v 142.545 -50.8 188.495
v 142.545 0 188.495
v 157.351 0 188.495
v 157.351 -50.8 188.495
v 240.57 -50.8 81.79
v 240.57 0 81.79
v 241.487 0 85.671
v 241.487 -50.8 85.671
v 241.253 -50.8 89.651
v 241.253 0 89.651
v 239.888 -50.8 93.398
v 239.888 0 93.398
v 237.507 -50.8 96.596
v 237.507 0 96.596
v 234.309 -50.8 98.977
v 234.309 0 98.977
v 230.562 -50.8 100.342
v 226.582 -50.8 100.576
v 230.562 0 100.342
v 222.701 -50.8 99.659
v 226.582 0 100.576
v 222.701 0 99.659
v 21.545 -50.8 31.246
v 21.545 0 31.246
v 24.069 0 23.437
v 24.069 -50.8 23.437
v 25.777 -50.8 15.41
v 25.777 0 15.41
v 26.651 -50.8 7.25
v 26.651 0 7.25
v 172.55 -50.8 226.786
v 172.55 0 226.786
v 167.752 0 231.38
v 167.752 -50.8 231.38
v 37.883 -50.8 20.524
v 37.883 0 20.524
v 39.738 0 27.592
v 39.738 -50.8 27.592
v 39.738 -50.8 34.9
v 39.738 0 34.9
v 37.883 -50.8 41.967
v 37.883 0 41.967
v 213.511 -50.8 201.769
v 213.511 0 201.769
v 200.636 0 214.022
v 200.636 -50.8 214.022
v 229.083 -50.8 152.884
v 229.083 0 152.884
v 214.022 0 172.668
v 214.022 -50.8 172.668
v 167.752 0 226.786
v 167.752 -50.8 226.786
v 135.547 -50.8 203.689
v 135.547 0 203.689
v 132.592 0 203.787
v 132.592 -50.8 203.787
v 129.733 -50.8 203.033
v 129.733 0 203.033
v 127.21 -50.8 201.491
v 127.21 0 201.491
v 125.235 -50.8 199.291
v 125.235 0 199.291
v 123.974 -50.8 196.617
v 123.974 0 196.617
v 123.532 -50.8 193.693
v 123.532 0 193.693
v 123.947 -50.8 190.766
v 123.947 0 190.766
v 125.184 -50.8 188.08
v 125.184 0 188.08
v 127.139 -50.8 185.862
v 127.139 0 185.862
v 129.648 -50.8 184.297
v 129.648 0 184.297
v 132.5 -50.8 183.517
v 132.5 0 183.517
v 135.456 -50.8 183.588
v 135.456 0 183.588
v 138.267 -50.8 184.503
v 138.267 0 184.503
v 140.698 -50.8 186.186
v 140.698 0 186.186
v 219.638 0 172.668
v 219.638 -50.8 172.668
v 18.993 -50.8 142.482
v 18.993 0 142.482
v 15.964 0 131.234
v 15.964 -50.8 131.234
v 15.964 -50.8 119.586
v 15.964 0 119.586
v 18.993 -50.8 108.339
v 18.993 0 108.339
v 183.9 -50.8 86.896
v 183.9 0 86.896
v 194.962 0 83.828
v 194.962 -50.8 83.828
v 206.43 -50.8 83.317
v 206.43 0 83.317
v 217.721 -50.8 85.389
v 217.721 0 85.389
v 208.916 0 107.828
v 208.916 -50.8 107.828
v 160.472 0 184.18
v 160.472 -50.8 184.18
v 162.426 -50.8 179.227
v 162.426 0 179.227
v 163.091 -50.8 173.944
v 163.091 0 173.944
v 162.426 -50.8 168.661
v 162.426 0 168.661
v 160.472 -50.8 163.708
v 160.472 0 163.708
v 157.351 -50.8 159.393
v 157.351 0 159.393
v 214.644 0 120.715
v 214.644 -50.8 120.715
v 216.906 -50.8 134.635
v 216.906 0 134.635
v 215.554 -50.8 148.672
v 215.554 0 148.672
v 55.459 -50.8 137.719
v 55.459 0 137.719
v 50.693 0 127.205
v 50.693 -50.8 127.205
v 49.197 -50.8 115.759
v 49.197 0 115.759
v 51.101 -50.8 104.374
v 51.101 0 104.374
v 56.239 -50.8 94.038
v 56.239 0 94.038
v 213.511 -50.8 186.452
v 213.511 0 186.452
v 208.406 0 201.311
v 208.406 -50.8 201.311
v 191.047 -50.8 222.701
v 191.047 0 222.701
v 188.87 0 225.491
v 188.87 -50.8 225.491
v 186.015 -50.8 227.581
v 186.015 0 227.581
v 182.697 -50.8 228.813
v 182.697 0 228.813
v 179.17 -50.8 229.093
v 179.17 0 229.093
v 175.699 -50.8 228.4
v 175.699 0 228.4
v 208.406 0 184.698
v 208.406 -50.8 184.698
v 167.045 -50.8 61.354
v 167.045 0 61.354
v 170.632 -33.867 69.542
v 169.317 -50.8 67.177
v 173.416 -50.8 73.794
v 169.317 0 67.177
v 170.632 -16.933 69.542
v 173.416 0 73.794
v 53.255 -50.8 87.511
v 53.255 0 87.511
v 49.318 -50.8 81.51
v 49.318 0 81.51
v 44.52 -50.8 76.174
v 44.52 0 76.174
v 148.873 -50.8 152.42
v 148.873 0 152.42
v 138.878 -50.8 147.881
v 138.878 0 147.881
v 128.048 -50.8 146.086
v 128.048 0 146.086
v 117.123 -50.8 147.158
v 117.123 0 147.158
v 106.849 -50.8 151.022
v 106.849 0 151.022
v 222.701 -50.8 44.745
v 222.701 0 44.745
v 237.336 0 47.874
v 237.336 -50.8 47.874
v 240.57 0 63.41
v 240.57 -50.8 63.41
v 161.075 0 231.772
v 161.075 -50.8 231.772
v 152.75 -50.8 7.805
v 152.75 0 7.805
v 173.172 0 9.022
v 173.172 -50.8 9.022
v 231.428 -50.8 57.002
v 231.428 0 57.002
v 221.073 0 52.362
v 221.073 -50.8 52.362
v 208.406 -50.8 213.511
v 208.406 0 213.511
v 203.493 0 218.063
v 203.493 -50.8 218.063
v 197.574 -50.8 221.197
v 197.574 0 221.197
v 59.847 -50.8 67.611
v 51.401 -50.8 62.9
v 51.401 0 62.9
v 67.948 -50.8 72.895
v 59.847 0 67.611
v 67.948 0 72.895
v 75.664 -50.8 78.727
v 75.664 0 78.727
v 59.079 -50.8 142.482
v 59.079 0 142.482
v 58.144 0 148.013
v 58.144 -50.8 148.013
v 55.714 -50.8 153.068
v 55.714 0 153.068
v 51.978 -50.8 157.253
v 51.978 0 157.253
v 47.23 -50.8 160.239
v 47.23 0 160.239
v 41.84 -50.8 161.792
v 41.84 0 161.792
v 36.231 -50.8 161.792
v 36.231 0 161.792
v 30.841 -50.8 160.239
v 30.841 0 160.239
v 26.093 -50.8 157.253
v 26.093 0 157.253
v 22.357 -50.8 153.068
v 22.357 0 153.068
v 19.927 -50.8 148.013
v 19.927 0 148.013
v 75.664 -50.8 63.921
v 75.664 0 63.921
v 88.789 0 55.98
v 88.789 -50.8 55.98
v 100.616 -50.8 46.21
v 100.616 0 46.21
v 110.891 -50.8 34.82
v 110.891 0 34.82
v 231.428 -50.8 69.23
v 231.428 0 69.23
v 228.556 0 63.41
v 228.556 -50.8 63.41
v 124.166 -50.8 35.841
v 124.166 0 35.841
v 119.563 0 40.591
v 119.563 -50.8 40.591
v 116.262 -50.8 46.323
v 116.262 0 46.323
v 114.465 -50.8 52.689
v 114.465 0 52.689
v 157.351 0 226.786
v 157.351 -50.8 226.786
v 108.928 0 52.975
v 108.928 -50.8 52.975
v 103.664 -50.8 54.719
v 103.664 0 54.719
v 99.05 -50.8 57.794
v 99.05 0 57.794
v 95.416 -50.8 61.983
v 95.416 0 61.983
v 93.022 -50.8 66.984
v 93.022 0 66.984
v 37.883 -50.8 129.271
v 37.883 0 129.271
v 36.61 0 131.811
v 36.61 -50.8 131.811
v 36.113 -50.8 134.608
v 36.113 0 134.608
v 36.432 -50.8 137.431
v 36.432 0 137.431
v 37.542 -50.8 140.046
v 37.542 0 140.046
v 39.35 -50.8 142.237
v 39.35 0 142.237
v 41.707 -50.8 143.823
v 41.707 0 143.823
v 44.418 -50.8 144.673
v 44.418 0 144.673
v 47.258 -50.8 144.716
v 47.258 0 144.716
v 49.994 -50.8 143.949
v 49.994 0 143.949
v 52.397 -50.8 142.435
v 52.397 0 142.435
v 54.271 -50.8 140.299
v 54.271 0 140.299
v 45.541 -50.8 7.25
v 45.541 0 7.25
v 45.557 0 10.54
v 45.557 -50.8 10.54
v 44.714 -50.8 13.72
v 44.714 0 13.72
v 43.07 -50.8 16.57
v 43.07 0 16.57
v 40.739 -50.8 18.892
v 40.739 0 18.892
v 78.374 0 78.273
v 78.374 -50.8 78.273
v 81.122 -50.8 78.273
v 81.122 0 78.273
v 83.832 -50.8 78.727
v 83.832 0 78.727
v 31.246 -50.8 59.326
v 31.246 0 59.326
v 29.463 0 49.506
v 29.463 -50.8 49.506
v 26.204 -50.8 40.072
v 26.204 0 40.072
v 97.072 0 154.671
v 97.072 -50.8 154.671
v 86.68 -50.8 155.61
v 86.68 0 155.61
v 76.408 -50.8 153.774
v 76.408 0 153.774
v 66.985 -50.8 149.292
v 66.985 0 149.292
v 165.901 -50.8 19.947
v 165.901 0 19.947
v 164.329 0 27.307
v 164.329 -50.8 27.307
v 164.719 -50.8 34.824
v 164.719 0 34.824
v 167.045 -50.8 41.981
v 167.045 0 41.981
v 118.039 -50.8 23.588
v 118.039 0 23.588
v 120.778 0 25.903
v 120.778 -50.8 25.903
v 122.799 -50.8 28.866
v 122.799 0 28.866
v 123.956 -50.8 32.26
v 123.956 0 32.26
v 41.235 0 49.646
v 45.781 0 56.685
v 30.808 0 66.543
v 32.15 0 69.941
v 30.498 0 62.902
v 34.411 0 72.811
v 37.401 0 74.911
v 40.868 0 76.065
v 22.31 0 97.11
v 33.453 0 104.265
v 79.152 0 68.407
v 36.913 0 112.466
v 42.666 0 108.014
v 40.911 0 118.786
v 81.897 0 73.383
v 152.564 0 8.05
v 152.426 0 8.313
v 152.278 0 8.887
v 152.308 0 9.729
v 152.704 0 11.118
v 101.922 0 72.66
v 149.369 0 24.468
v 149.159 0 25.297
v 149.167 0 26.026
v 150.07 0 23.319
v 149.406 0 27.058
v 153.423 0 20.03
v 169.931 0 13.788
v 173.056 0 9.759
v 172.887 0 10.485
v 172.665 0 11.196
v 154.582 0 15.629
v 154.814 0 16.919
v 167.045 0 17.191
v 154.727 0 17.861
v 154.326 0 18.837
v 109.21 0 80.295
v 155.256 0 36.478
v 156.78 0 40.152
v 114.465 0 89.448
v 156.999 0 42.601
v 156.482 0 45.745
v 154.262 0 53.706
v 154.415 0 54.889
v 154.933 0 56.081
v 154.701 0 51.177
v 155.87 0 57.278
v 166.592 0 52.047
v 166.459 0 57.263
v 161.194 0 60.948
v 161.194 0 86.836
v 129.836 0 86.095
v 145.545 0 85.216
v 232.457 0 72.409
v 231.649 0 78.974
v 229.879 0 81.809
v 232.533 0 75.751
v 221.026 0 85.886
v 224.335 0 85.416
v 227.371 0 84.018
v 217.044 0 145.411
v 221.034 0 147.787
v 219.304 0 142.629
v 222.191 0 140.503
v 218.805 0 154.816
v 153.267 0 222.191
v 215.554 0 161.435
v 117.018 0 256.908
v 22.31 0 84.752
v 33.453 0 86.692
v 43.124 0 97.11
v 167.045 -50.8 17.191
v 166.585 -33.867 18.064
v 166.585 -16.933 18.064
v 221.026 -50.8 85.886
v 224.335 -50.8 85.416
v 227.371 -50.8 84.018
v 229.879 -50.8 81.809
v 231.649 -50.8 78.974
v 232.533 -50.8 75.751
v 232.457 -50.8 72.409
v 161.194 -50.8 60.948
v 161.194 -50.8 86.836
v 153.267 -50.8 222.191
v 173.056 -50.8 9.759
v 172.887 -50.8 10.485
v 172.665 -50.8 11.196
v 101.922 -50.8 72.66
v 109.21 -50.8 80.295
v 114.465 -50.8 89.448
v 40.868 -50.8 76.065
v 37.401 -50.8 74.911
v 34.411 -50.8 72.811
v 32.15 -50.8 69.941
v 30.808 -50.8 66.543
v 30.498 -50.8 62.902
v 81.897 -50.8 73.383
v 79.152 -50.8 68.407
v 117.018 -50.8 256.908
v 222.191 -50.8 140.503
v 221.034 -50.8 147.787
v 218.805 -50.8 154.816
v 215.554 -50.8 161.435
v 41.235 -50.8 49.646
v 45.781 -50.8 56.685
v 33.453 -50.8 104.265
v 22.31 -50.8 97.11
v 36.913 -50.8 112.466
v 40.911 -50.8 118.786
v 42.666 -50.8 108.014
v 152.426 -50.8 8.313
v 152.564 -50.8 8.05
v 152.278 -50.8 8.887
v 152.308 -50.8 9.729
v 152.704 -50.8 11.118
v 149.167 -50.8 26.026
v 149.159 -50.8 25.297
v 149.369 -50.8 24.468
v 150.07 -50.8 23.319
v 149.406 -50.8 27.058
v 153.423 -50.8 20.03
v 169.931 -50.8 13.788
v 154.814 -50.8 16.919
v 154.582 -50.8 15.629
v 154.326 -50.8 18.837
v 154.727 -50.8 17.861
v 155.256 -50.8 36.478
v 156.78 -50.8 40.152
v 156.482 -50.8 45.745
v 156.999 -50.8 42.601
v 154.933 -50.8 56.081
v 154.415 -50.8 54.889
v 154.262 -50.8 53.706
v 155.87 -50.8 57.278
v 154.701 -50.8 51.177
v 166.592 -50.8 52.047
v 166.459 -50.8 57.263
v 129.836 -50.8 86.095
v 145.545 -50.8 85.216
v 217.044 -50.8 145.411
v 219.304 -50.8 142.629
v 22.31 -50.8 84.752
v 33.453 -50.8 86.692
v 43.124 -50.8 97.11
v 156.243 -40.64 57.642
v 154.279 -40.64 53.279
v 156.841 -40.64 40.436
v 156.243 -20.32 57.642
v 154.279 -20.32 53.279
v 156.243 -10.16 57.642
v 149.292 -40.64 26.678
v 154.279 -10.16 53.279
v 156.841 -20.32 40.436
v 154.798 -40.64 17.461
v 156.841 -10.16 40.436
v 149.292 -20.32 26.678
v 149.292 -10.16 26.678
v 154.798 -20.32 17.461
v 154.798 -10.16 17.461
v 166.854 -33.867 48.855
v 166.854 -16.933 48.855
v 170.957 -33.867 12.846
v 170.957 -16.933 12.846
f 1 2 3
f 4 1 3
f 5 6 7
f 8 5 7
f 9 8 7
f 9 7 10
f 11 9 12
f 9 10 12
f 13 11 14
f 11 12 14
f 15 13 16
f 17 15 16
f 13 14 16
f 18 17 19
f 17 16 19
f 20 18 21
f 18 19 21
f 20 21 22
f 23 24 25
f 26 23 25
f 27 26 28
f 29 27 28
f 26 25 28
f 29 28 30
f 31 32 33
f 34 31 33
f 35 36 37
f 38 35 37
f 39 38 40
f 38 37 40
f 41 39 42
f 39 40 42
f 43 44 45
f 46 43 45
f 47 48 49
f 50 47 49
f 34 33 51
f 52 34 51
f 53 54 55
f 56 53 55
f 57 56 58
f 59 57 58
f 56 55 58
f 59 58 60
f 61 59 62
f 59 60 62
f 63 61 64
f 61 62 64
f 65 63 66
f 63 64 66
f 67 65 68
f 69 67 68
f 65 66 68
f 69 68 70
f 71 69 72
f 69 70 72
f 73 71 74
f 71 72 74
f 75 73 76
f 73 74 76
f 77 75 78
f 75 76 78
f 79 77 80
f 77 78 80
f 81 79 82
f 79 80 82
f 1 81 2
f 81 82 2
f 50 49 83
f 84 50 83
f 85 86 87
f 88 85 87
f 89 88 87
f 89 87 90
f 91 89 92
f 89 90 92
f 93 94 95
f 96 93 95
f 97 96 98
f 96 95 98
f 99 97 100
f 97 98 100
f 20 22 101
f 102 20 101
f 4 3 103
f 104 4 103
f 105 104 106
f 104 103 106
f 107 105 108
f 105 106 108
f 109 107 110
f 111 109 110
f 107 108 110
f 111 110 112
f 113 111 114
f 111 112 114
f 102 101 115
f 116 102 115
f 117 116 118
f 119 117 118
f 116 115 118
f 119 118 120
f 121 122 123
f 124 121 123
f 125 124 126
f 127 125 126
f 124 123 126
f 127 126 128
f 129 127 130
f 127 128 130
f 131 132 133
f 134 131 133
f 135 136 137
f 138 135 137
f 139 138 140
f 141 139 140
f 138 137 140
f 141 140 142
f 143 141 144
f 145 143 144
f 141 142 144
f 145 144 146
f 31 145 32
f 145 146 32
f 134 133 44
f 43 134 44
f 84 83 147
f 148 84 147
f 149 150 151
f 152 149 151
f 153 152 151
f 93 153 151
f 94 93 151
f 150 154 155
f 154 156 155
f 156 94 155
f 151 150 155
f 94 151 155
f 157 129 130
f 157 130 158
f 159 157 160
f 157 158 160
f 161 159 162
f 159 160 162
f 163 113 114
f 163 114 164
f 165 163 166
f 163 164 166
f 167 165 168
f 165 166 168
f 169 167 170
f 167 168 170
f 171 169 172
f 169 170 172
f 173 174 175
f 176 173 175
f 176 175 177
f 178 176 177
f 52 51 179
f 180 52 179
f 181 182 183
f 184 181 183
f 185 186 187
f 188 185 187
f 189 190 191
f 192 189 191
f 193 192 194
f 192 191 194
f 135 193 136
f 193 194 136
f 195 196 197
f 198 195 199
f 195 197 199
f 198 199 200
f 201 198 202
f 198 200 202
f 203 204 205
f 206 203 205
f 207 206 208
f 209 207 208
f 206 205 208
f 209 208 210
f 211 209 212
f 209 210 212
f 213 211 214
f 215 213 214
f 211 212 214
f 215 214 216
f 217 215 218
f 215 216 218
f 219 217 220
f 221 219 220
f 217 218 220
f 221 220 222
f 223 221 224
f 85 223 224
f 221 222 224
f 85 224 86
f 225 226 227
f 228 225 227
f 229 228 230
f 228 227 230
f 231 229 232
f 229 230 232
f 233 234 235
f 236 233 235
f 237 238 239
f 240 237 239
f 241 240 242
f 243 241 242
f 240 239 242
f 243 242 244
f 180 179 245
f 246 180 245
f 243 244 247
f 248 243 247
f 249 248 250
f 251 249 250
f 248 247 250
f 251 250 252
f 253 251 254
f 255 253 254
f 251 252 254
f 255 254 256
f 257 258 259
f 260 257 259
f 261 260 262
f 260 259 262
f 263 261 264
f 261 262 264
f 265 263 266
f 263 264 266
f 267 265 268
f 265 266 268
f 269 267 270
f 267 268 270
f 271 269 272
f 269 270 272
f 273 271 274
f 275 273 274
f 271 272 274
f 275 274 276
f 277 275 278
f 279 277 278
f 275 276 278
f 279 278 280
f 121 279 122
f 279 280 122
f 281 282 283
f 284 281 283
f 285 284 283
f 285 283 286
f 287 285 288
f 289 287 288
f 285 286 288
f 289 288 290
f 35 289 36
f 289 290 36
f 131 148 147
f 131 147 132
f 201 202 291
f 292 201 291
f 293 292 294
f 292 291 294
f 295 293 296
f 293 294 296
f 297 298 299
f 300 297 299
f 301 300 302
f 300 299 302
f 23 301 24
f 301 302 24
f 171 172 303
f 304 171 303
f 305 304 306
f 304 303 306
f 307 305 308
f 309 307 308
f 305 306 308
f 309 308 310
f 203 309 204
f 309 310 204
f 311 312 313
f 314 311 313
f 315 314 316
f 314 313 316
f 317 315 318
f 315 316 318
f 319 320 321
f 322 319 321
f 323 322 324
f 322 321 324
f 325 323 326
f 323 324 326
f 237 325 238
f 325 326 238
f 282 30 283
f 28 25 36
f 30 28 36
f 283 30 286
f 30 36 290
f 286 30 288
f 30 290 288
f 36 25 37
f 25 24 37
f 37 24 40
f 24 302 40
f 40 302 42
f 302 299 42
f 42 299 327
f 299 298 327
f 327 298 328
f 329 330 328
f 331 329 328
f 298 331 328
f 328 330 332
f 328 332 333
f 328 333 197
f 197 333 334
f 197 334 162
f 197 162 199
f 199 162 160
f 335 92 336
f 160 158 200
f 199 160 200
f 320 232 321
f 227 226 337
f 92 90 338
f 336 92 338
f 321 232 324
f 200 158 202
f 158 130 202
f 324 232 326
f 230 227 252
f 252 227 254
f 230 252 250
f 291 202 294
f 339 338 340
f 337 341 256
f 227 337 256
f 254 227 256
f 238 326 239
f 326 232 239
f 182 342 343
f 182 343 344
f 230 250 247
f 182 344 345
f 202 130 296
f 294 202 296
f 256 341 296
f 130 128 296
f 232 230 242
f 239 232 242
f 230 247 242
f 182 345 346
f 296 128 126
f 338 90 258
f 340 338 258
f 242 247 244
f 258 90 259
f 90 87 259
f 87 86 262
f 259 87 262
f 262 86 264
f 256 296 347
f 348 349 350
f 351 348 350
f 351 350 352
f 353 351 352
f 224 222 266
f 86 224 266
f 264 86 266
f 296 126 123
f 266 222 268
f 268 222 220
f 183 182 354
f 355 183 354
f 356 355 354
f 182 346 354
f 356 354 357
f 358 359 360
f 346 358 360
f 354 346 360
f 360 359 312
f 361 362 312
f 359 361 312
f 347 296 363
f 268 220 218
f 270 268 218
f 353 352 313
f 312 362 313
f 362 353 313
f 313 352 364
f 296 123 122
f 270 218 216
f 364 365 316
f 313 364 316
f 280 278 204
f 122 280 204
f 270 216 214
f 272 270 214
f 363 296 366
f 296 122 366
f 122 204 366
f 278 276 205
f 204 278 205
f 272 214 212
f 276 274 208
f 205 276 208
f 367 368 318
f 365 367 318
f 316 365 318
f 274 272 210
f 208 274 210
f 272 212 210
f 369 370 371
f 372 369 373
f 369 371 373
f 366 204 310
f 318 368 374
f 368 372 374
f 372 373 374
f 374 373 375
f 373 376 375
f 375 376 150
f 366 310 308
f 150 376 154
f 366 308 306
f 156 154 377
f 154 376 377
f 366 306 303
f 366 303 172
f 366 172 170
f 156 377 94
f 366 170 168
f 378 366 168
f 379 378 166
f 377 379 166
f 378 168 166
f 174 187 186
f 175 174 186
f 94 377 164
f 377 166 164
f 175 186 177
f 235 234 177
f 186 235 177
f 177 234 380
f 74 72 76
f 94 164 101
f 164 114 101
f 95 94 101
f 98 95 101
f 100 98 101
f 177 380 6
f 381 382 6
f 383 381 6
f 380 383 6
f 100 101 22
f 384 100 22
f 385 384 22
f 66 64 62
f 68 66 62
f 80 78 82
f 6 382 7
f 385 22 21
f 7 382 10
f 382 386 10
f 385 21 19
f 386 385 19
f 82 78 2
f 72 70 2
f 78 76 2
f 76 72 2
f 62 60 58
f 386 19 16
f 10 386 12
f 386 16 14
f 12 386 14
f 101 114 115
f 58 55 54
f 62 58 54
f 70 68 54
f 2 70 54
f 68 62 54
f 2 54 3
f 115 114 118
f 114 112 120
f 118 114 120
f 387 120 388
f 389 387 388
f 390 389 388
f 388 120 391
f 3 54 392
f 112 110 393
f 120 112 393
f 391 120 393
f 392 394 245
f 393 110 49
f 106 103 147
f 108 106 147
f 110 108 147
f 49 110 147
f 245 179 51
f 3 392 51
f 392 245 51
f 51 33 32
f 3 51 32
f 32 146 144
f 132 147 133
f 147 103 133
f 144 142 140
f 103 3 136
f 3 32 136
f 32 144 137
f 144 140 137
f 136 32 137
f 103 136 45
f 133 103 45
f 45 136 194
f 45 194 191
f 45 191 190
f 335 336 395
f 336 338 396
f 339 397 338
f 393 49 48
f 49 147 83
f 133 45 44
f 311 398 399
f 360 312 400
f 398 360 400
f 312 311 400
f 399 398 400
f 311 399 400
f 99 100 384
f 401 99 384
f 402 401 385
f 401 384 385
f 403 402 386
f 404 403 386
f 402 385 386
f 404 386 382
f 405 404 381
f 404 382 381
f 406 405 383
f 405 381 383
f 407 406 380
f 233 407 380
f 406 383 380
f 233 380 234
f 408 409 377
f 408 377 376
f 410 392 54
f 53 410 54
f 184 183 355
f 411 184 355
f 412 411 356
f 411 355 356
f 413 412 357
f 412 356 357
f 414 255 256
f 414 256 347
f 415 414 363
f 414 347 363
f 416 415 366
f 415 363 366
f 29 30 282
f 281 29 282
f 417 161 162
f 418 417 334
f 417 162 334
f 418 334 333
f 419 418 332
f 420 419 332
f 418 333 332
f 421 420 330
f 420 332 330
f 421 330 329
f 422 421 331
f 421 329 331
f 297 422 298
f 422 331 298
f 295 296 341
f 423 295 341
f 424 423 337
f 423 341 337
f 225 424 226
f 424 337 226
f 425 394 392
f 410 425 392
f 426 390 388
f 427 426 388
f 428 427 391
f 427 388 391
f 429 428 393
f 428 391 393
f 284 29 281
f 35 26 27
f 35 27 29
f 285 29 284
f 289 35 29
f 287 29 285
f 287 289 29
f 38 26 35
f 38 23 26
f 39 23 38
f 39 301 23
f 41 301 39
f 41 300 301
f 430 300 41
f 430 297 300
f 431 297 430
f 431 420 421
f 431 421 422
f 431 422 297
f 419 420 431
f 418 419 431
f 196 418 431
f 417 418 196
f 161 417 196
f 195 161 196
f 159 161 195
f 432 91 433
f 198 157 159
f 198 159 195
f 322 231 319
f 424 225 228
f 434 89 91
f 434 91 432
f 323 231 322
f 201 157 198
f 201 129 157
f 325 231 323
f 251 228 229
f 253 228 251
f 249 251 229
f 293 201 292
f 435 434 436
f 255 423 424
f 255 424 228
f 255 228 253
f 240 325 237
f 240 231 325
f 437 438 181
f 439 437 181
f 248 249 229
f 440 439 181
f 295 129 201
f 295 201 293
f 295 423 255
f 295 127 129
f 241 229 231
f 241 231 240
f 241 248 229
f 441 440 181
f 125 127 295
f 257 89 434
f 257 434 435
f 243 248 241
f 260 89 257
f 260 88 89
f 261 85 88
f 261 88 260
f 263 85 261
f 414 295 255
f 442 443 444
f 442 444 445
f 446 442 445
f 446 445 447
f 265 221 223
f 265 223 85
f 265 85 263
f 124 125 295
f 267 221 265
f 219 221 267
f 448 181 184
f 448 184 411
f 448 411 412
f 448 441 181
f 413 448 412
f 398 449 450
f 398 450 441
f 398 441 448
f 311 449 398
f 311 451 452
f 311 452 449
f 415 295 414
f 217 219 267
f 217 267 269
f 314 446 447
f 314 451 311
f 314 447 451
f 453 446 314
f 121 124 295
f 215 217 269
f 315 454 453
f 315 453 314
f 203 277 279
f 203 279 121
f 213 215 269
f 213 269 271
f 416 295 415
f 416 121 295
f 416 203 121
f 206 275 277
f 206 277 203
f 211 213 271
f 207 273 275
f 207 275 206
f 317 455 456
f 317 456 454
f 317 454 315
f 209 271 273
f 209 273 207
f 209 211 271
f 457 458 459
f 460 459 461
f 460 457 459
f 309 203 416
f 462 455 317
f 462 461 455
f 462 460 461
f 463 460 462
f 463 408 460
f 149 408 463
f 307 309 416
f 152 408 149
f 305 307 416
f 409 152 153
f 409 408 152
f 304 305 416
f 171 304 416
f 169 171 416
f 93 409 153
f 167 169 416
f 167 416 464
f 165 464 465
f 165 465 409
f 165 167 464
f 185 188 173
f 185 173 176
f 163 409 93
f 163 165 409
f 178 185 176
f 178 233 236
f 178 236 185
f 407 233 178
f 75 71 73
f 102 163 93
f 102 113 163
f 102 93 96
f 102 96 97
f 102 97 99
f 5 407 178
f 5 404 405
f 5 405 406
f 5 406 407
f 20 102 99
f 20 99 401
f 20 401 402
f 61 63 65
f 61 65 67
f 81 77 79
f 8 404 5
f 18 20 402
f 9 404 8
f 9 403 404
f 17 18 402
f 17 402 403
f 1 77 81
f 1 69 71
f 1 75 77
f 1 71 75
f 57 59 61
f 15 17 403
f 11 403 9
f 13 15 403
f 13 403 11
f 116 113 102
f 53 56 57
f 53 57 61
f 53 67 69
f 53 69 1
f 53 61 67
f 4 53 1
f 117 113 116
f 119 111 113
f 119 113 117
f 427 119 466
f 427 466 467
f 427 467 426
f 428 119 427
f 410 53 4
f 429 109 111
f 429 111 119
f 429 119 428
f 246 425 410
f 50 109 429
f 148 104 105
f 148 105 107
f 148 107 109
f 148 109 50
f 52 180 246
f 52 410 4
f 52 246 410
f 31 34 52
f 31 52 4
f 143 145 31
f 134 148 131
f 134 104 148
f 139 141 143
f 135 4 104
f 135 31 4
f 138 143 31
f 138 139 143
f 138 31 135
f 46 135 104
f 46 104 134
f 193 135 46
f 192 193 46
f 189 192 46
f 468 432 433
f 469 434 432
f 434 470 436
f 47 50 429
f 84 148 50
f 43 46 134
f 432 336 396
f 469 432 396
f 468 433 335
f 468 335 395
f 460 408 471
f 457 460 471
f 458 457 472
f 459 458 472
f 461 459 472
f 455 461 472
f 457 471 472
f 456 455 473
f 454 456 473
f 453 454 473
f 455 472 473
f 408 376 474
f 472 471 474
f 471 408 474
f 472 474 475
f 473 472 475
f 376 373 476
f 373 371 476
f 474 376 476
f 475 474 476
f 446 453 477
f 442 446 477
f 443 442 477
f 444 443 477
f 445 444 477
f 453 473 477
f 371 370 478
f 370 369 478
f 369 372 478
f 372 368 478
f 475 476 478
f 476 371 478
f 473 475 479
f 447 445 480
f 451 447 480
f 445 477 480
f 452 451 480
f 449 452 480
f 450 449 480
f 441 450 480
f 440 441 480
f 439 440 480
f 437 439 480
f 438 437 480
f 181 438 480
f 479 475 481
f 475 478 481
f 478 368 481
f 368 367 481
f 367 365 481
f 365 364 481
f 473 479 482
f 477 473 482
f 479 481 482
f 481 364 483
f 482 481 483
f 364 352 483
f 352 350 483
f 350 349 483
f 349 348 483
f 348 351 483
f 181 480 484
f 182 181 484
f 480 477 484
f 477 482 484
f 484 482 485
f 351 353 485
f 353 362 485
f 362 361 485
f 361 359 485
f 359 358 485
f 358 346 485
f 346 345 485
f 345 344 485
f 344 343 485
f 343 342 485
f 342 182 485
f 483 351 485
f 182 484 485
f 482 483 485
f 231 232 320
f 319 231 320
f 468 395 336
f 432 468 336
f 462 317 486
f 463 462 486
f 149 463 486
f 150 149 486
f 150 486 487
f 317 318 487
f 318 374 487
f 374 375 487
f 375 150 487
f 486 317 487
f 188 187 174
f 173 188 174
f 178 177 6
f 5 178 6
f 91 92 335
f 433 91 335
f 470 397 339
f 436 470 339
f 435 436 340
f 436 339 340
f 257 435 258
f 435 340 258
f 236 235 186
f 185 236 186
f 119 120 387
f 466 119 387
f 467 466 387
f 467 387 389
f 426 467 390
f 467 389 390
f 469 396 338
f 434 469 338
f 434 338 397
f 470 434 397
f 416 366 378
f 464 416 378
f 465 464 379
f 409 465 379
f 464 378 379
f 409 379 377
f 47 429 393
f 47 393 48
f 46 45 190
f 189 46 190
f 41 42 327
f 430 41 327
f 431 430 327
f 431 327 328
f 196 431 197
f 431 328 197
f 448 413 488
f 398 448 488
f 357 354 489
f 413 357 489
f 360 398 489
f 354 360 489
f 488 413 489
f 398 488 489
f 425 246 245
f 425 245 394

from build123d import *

# Parameters (mm, degrees)
F1_DEPTH = 50.8


with BuildPart() as f1:
    # F0 (on Front) → F1 (new body)
    with BuildSketch(Plane.XZ):
        with BuildLine():
            Line((157.3511064053, 226.7855703831), (117.0178577304, 256.9078505039))
            Line((117.0178577304, 256.9078505039), (153.2667279243, 222.1906334162))
            Line((153.2667279243, 222.1906334162), (135.5471188815, 203.6892712114))
            ThreePointArc((135.5471188815, 203.6892712114), (124.4679795229, 189.3777542773), (142.5452232361, 188.4945183992))
            Line((142.5452232361, 188.4945183992), (157.3511064053, 188.4945183992))
            ThreePointArc((157.3511064053, 188.4945183992), (163.0913283676, 173.9439144731), (157.3511064053, 159.3933105469))
            ThreePointArc((157.3511064053, 159.3933105469), (133.5218764448, 146.628732852), (106.8485764131, 151.0221039559))
            ThreePointArc((106.8485764131, 151.0221039559), (81.4826477265, 155.0355463169), (59.0786326768, 142.4817354462))
            ThreePointArc((59.0786326768, 142.4817354462), (57.1778936646, 140.1694279188), (55.4591871163, 137.7187907169))
            ThreePointArc((55.4591871163, 137.7187907169), (49.1972996165, 115.7594263547), (56.2388920861, 94.0375274104))
            ThreePointArc((56.2388920861, 94.0375274104), (51.4005357949, 84.435997918), (44.5201359689, 76.1740878224))
            ThreePointArc((44.5201359689, 76.1740878224), (33.1757105593, 71.4588467738), (31.2459021807, 59.3260265887))
            ThreePointArc((31.2459021807, 59.3260265887), (28.0144474885, 44.7267728634), (21.5454995632, 31.2459263951))
            ThreePointArc((21.5454995632, 31.2459263951), (25.0258299967, 19.4454210796), (26.6509782523, 7.2501958348))
            Line((26.6509782523, 7.2501958348), (45.5412305892, 7.2501958348))
            ThreePointArc((45.5412305892, 7.2501958348), (43.9865002742, 15.1994537749), (37.8830172122, 20.52443102))
            ThreePointArc((37.8830172122, 20.52443102), (39.9724122876, 31.2459263951), (37.8830172122, 41.9674217701))
            ThreePointArc((37.8830172122, 41.9674217701), (43.3657124777, 53.2576823746), (51.4005357949, 62.8998577595))
            ThreePointArc((51.4005357949, 62.8998577595), (63.9434482796, 70.1826306752), (75.6635218859, 78.7268280983))
            ThreePointArc((75.6635218859, 78.7268280983), (79.7479003668, 78.2162845135), (83.8322788477, 78.7268280983))
            ThreePointArc((83.8322788477, 78.7268280983), (80.62219761, 70.8415194676), (75.6635218859, 63.9209523797))
            ThreePointArc((75.6635218859, 63.9209523797), (94.8811032097, 51.3116760169), (110.8912838002, 34.8197567898))
            Line((110.8912838002, 34.8197567898), (118.0389523506, 23.5877130181))
            ThreePointArc((118.0389523506, 23.5877130181), (122.7991958663, 28.8657998516), (124.165520072, 35.8408465981))
            ThreePointArc((124.165520072, 35.8408465981), (117.7349645729, 43.3549786498), (114.4651249051, 52.6889152825))
            ThreePointArc((114.4651249051, 52.6889152825), (101.2536184714, 56.1015596962), (93.0221304297, 66.9842362404))
            ThreePointArc((93.0221304297, 66.9842362404), (105.7958752022, 76.2573128263), (114.4651249051, 89.4483178854))
            ThreePointArc((114.4651249051, 89.4483178854), (137.6729881459, 85.3431639936), (161.1937859731, 86.8362394266))
            Line((161.1937859731, 86.8362394266), (161.1937859731, 60.947837063))
            add(Edge.make_bspline(
                [(161.1937859731, 60.947837063), (157.8993693687, 59.0561358776), (150.6323180509, 54.8832909577), (162.2144334117, 39.9763215602), (143.2040633117, 24.6385665246), (159.3573781955, 18.7003155427), (150.8482458466, 9.9391907933), (152.7499995265, 7.8050355296)],
                knots=[0, 0, 0, 0, 0.0779334272, 0.1719109278, 0.2757758884, 0.3531240541, 0.4319815568, 0.4319815568, 0.4319815568, 0.4319815568], degree=3))
            Line((152.7499995265, 7.8050355296), (173.171891931, 9.0224858617))
            ThreePointArc((173.171891931, 9.0224858617), (172.9779809567, 10.1232568284), (172.664853356, 11.1962196856))
            add(Edge.make_bspline(
                [(172.664853356, 11.1962196856), (171.3313436819, 12.7085104711), (168.5824067748, 14.597468285), (167.0453242097, 17.1912484114)],
                knots=[0.5736467919, 0.5736467919, 0.5736467919, 0.5736467919, 0.6257117477, 0.6257117477, 0.6257117477, 0.6257117477], degree=3))
            add(Edge.make_bspline(
                [(167.0453242097, 17.1912484114), (166.5426299969, 18.0395296218), (166.169553332, 18.9631972351), (165.9011092746, 19.9468993754)],
                knots=[0.6257117477, 0.6257117477, 0.6257117477, 0.6257117477, 0.6427392989, 0.6427392989, 0.6427392989, 0.6427392989], degree=3))
            ThreePointArc((165.9011092746, 19.9468993754), (164.2768081704, 31.0782012829), (167.0453242097, 41.9813914203))
            add(Edge.make_bspline(
                [(167.0453242097, 41.9813914203), (167.3962963394, 49.2992780507), (165.4846355858, 55.0477309675), (167.0453242097, 61.3542387283)],
                knots=[0.7506807864, 0.7506807864, 0.7506807864, 0.7506807864, 0.8611546748, 0.8611546748, 0.8611546748, 0.8611546748], degree=3))
            add(Edge.make_bspline(
                [(167.0453242097, 61.3542387283), (169.0068222846, 69.2803571375), (176.4531944079, 78.0879710988), (183.8995665312, 86.8955850601)],
                knots=[0.8611546748, 0.8611546748, 0.8611546748, 0.8611546748, 1, 1, 1, 1], degree=3))
            ThreePointArc((183.8995665312, 86.8955850601), (200.6813055662, 83.248064902), (217.7208593273, 85.3892738977))
            ThreePointArc((217.7208593273, 85.3892738977), (229.8786920932, 81.8087152157), (231.4277632013, 69.2296183983))
            Line((231.4277632013, 69.2296183983), (228.5562352695, 63.4104087949))
            Line((228.5562352695, 63.4104087949), (231.4277632013, 57.001966241))
            Line((231.4277632013, 57.001966241), (221.0727564471, 52.3620415043))
            Line((221.0727564471, 52.3620415043), (222.7011620998, 44.7454368664))
            Line((222.7011620998, 44.7454368664), (237.3357014598, 47.8742544631))
            Line((237.3357014598, 47.8742544631), (240.5703216791, 63.4104087949))
            Line((240.5703216791, 63.4104087949), (240.5703216791, 81.790111959))
            ThreePointArc((240.5703216791, 81.790111959), (237.5070340931, 96.5959839523), (222.7011620998, 99.6592715383))
            Line((222.7011620998, 99.6592715383), (208.9163959026, 107.8280285001))
            ThreePointArc((208.9163959026, 107.8280285001), (216.2226754166, 127.6019199845), (215.5535072088, 148.6718207598))
            ThreePointArc((215.5535072088, 148.6718207598), (218.0854842896, 143.9483475476), (222.190618515, 140.503063798))
            ThreePointArc((222.190618515, 140.503063798), (220.0514151702, 151.3432226251), (215.5535072088, 161.4354997873))
            Line((215.5535072088, 161.4354997873), (229.0830209851, 152.8838410974))
            Line((229.0830209851, 152.8838410974), (214.0218615532, 172.6675480604))
            Line((214.0218615532, 172.6675480604), (219.6378856897, 172.6675480604))
            Line((219.6378856897, 172.6675480604), (208.4058374166, 184.6981031667))
            Line((208.4058374166, 184.6981031667), (213.5113179684, 186.4523291588))
            Line((213.5113179684, 186.4523291588), (208.4058374166, 201.3112651118))
            Line((208.4058374166, 201.3112651118), (213.5113179684, 201.7687410116))
            Line((213.5113179684, 201.7687410116), (200.6355195315, 214.0218764544))
            Line((200.6355195315, 214.0218764544), (208.4058374166, 213.5113328695))
            ThreePointArc((208.4058374166, 213.5113328695), (200.6355195315, 219.8232430535), (191.0472214222, 222.7011919022))
            ThreePointArc((191.0472214222, 222.7011919022), (182.6973201136, 228.8132361759), (172.5500786904, 226.7855703831))
            Line((172.5500786904, 226.7855703831), (167.7524379956, 231.3804924488))
            Line((167.7524379956, 231.3804924488), (167.7524379956, 226.7855703831))
            Line((167.7524379956, 226.7855703831), (161.0753406305, 231.77226012))
            Line((161.0753406305, 231.77226012), (157.3511064053, 226.7855703831))
        make_face()
        with BuildLine():
            ThreePointArc((55.4591871163, 137.7187907169), (57.1778936646, 140.1694279188), (59.0786326768, 142.4817354462))
            ThreePointArc((59.0786326768, 142.4817354462), (39.0356978447, 161.9894984881), (18.9927630126, 142.4817354462))
            ThreePointArc((18.9927630126, 142.4817354462), (15.5809128086, 125.4101537656), (18.9927630126, 108.3385720849))
            Line((18.9927630126, 108.3385720849), (22.309999913, 97.1100777388))
            Line((22.309999913, 97.1100777388), (22.309999913, 84.7518071532))
            Line((22.309999913, 84.7518071532), (33.4528027138, 104.264870286))
            Line((33.4528027138, 104.264870286), (33.4528027138, 86.6916491587))
            Line((33.4528027138, 86.6916491587), (36.9130928491, 112.466349486))
            Line((36.9130928491, 112.466349486), (43.123934418, 97.1100777388))
            ThreePointArc((43.123934418, 97.1100777388), (41.9493193566, 113.4261599819), (37.8830172122, 129.2710155249))
            ThreePointArc((37.8830172122, 129.2710155249), (41.7069327363, 143.8231946906), (55.4591871163, 137.7187907169))
        make_face()
    extrude(amount=F1_DEPTH)


solid = f1.part
